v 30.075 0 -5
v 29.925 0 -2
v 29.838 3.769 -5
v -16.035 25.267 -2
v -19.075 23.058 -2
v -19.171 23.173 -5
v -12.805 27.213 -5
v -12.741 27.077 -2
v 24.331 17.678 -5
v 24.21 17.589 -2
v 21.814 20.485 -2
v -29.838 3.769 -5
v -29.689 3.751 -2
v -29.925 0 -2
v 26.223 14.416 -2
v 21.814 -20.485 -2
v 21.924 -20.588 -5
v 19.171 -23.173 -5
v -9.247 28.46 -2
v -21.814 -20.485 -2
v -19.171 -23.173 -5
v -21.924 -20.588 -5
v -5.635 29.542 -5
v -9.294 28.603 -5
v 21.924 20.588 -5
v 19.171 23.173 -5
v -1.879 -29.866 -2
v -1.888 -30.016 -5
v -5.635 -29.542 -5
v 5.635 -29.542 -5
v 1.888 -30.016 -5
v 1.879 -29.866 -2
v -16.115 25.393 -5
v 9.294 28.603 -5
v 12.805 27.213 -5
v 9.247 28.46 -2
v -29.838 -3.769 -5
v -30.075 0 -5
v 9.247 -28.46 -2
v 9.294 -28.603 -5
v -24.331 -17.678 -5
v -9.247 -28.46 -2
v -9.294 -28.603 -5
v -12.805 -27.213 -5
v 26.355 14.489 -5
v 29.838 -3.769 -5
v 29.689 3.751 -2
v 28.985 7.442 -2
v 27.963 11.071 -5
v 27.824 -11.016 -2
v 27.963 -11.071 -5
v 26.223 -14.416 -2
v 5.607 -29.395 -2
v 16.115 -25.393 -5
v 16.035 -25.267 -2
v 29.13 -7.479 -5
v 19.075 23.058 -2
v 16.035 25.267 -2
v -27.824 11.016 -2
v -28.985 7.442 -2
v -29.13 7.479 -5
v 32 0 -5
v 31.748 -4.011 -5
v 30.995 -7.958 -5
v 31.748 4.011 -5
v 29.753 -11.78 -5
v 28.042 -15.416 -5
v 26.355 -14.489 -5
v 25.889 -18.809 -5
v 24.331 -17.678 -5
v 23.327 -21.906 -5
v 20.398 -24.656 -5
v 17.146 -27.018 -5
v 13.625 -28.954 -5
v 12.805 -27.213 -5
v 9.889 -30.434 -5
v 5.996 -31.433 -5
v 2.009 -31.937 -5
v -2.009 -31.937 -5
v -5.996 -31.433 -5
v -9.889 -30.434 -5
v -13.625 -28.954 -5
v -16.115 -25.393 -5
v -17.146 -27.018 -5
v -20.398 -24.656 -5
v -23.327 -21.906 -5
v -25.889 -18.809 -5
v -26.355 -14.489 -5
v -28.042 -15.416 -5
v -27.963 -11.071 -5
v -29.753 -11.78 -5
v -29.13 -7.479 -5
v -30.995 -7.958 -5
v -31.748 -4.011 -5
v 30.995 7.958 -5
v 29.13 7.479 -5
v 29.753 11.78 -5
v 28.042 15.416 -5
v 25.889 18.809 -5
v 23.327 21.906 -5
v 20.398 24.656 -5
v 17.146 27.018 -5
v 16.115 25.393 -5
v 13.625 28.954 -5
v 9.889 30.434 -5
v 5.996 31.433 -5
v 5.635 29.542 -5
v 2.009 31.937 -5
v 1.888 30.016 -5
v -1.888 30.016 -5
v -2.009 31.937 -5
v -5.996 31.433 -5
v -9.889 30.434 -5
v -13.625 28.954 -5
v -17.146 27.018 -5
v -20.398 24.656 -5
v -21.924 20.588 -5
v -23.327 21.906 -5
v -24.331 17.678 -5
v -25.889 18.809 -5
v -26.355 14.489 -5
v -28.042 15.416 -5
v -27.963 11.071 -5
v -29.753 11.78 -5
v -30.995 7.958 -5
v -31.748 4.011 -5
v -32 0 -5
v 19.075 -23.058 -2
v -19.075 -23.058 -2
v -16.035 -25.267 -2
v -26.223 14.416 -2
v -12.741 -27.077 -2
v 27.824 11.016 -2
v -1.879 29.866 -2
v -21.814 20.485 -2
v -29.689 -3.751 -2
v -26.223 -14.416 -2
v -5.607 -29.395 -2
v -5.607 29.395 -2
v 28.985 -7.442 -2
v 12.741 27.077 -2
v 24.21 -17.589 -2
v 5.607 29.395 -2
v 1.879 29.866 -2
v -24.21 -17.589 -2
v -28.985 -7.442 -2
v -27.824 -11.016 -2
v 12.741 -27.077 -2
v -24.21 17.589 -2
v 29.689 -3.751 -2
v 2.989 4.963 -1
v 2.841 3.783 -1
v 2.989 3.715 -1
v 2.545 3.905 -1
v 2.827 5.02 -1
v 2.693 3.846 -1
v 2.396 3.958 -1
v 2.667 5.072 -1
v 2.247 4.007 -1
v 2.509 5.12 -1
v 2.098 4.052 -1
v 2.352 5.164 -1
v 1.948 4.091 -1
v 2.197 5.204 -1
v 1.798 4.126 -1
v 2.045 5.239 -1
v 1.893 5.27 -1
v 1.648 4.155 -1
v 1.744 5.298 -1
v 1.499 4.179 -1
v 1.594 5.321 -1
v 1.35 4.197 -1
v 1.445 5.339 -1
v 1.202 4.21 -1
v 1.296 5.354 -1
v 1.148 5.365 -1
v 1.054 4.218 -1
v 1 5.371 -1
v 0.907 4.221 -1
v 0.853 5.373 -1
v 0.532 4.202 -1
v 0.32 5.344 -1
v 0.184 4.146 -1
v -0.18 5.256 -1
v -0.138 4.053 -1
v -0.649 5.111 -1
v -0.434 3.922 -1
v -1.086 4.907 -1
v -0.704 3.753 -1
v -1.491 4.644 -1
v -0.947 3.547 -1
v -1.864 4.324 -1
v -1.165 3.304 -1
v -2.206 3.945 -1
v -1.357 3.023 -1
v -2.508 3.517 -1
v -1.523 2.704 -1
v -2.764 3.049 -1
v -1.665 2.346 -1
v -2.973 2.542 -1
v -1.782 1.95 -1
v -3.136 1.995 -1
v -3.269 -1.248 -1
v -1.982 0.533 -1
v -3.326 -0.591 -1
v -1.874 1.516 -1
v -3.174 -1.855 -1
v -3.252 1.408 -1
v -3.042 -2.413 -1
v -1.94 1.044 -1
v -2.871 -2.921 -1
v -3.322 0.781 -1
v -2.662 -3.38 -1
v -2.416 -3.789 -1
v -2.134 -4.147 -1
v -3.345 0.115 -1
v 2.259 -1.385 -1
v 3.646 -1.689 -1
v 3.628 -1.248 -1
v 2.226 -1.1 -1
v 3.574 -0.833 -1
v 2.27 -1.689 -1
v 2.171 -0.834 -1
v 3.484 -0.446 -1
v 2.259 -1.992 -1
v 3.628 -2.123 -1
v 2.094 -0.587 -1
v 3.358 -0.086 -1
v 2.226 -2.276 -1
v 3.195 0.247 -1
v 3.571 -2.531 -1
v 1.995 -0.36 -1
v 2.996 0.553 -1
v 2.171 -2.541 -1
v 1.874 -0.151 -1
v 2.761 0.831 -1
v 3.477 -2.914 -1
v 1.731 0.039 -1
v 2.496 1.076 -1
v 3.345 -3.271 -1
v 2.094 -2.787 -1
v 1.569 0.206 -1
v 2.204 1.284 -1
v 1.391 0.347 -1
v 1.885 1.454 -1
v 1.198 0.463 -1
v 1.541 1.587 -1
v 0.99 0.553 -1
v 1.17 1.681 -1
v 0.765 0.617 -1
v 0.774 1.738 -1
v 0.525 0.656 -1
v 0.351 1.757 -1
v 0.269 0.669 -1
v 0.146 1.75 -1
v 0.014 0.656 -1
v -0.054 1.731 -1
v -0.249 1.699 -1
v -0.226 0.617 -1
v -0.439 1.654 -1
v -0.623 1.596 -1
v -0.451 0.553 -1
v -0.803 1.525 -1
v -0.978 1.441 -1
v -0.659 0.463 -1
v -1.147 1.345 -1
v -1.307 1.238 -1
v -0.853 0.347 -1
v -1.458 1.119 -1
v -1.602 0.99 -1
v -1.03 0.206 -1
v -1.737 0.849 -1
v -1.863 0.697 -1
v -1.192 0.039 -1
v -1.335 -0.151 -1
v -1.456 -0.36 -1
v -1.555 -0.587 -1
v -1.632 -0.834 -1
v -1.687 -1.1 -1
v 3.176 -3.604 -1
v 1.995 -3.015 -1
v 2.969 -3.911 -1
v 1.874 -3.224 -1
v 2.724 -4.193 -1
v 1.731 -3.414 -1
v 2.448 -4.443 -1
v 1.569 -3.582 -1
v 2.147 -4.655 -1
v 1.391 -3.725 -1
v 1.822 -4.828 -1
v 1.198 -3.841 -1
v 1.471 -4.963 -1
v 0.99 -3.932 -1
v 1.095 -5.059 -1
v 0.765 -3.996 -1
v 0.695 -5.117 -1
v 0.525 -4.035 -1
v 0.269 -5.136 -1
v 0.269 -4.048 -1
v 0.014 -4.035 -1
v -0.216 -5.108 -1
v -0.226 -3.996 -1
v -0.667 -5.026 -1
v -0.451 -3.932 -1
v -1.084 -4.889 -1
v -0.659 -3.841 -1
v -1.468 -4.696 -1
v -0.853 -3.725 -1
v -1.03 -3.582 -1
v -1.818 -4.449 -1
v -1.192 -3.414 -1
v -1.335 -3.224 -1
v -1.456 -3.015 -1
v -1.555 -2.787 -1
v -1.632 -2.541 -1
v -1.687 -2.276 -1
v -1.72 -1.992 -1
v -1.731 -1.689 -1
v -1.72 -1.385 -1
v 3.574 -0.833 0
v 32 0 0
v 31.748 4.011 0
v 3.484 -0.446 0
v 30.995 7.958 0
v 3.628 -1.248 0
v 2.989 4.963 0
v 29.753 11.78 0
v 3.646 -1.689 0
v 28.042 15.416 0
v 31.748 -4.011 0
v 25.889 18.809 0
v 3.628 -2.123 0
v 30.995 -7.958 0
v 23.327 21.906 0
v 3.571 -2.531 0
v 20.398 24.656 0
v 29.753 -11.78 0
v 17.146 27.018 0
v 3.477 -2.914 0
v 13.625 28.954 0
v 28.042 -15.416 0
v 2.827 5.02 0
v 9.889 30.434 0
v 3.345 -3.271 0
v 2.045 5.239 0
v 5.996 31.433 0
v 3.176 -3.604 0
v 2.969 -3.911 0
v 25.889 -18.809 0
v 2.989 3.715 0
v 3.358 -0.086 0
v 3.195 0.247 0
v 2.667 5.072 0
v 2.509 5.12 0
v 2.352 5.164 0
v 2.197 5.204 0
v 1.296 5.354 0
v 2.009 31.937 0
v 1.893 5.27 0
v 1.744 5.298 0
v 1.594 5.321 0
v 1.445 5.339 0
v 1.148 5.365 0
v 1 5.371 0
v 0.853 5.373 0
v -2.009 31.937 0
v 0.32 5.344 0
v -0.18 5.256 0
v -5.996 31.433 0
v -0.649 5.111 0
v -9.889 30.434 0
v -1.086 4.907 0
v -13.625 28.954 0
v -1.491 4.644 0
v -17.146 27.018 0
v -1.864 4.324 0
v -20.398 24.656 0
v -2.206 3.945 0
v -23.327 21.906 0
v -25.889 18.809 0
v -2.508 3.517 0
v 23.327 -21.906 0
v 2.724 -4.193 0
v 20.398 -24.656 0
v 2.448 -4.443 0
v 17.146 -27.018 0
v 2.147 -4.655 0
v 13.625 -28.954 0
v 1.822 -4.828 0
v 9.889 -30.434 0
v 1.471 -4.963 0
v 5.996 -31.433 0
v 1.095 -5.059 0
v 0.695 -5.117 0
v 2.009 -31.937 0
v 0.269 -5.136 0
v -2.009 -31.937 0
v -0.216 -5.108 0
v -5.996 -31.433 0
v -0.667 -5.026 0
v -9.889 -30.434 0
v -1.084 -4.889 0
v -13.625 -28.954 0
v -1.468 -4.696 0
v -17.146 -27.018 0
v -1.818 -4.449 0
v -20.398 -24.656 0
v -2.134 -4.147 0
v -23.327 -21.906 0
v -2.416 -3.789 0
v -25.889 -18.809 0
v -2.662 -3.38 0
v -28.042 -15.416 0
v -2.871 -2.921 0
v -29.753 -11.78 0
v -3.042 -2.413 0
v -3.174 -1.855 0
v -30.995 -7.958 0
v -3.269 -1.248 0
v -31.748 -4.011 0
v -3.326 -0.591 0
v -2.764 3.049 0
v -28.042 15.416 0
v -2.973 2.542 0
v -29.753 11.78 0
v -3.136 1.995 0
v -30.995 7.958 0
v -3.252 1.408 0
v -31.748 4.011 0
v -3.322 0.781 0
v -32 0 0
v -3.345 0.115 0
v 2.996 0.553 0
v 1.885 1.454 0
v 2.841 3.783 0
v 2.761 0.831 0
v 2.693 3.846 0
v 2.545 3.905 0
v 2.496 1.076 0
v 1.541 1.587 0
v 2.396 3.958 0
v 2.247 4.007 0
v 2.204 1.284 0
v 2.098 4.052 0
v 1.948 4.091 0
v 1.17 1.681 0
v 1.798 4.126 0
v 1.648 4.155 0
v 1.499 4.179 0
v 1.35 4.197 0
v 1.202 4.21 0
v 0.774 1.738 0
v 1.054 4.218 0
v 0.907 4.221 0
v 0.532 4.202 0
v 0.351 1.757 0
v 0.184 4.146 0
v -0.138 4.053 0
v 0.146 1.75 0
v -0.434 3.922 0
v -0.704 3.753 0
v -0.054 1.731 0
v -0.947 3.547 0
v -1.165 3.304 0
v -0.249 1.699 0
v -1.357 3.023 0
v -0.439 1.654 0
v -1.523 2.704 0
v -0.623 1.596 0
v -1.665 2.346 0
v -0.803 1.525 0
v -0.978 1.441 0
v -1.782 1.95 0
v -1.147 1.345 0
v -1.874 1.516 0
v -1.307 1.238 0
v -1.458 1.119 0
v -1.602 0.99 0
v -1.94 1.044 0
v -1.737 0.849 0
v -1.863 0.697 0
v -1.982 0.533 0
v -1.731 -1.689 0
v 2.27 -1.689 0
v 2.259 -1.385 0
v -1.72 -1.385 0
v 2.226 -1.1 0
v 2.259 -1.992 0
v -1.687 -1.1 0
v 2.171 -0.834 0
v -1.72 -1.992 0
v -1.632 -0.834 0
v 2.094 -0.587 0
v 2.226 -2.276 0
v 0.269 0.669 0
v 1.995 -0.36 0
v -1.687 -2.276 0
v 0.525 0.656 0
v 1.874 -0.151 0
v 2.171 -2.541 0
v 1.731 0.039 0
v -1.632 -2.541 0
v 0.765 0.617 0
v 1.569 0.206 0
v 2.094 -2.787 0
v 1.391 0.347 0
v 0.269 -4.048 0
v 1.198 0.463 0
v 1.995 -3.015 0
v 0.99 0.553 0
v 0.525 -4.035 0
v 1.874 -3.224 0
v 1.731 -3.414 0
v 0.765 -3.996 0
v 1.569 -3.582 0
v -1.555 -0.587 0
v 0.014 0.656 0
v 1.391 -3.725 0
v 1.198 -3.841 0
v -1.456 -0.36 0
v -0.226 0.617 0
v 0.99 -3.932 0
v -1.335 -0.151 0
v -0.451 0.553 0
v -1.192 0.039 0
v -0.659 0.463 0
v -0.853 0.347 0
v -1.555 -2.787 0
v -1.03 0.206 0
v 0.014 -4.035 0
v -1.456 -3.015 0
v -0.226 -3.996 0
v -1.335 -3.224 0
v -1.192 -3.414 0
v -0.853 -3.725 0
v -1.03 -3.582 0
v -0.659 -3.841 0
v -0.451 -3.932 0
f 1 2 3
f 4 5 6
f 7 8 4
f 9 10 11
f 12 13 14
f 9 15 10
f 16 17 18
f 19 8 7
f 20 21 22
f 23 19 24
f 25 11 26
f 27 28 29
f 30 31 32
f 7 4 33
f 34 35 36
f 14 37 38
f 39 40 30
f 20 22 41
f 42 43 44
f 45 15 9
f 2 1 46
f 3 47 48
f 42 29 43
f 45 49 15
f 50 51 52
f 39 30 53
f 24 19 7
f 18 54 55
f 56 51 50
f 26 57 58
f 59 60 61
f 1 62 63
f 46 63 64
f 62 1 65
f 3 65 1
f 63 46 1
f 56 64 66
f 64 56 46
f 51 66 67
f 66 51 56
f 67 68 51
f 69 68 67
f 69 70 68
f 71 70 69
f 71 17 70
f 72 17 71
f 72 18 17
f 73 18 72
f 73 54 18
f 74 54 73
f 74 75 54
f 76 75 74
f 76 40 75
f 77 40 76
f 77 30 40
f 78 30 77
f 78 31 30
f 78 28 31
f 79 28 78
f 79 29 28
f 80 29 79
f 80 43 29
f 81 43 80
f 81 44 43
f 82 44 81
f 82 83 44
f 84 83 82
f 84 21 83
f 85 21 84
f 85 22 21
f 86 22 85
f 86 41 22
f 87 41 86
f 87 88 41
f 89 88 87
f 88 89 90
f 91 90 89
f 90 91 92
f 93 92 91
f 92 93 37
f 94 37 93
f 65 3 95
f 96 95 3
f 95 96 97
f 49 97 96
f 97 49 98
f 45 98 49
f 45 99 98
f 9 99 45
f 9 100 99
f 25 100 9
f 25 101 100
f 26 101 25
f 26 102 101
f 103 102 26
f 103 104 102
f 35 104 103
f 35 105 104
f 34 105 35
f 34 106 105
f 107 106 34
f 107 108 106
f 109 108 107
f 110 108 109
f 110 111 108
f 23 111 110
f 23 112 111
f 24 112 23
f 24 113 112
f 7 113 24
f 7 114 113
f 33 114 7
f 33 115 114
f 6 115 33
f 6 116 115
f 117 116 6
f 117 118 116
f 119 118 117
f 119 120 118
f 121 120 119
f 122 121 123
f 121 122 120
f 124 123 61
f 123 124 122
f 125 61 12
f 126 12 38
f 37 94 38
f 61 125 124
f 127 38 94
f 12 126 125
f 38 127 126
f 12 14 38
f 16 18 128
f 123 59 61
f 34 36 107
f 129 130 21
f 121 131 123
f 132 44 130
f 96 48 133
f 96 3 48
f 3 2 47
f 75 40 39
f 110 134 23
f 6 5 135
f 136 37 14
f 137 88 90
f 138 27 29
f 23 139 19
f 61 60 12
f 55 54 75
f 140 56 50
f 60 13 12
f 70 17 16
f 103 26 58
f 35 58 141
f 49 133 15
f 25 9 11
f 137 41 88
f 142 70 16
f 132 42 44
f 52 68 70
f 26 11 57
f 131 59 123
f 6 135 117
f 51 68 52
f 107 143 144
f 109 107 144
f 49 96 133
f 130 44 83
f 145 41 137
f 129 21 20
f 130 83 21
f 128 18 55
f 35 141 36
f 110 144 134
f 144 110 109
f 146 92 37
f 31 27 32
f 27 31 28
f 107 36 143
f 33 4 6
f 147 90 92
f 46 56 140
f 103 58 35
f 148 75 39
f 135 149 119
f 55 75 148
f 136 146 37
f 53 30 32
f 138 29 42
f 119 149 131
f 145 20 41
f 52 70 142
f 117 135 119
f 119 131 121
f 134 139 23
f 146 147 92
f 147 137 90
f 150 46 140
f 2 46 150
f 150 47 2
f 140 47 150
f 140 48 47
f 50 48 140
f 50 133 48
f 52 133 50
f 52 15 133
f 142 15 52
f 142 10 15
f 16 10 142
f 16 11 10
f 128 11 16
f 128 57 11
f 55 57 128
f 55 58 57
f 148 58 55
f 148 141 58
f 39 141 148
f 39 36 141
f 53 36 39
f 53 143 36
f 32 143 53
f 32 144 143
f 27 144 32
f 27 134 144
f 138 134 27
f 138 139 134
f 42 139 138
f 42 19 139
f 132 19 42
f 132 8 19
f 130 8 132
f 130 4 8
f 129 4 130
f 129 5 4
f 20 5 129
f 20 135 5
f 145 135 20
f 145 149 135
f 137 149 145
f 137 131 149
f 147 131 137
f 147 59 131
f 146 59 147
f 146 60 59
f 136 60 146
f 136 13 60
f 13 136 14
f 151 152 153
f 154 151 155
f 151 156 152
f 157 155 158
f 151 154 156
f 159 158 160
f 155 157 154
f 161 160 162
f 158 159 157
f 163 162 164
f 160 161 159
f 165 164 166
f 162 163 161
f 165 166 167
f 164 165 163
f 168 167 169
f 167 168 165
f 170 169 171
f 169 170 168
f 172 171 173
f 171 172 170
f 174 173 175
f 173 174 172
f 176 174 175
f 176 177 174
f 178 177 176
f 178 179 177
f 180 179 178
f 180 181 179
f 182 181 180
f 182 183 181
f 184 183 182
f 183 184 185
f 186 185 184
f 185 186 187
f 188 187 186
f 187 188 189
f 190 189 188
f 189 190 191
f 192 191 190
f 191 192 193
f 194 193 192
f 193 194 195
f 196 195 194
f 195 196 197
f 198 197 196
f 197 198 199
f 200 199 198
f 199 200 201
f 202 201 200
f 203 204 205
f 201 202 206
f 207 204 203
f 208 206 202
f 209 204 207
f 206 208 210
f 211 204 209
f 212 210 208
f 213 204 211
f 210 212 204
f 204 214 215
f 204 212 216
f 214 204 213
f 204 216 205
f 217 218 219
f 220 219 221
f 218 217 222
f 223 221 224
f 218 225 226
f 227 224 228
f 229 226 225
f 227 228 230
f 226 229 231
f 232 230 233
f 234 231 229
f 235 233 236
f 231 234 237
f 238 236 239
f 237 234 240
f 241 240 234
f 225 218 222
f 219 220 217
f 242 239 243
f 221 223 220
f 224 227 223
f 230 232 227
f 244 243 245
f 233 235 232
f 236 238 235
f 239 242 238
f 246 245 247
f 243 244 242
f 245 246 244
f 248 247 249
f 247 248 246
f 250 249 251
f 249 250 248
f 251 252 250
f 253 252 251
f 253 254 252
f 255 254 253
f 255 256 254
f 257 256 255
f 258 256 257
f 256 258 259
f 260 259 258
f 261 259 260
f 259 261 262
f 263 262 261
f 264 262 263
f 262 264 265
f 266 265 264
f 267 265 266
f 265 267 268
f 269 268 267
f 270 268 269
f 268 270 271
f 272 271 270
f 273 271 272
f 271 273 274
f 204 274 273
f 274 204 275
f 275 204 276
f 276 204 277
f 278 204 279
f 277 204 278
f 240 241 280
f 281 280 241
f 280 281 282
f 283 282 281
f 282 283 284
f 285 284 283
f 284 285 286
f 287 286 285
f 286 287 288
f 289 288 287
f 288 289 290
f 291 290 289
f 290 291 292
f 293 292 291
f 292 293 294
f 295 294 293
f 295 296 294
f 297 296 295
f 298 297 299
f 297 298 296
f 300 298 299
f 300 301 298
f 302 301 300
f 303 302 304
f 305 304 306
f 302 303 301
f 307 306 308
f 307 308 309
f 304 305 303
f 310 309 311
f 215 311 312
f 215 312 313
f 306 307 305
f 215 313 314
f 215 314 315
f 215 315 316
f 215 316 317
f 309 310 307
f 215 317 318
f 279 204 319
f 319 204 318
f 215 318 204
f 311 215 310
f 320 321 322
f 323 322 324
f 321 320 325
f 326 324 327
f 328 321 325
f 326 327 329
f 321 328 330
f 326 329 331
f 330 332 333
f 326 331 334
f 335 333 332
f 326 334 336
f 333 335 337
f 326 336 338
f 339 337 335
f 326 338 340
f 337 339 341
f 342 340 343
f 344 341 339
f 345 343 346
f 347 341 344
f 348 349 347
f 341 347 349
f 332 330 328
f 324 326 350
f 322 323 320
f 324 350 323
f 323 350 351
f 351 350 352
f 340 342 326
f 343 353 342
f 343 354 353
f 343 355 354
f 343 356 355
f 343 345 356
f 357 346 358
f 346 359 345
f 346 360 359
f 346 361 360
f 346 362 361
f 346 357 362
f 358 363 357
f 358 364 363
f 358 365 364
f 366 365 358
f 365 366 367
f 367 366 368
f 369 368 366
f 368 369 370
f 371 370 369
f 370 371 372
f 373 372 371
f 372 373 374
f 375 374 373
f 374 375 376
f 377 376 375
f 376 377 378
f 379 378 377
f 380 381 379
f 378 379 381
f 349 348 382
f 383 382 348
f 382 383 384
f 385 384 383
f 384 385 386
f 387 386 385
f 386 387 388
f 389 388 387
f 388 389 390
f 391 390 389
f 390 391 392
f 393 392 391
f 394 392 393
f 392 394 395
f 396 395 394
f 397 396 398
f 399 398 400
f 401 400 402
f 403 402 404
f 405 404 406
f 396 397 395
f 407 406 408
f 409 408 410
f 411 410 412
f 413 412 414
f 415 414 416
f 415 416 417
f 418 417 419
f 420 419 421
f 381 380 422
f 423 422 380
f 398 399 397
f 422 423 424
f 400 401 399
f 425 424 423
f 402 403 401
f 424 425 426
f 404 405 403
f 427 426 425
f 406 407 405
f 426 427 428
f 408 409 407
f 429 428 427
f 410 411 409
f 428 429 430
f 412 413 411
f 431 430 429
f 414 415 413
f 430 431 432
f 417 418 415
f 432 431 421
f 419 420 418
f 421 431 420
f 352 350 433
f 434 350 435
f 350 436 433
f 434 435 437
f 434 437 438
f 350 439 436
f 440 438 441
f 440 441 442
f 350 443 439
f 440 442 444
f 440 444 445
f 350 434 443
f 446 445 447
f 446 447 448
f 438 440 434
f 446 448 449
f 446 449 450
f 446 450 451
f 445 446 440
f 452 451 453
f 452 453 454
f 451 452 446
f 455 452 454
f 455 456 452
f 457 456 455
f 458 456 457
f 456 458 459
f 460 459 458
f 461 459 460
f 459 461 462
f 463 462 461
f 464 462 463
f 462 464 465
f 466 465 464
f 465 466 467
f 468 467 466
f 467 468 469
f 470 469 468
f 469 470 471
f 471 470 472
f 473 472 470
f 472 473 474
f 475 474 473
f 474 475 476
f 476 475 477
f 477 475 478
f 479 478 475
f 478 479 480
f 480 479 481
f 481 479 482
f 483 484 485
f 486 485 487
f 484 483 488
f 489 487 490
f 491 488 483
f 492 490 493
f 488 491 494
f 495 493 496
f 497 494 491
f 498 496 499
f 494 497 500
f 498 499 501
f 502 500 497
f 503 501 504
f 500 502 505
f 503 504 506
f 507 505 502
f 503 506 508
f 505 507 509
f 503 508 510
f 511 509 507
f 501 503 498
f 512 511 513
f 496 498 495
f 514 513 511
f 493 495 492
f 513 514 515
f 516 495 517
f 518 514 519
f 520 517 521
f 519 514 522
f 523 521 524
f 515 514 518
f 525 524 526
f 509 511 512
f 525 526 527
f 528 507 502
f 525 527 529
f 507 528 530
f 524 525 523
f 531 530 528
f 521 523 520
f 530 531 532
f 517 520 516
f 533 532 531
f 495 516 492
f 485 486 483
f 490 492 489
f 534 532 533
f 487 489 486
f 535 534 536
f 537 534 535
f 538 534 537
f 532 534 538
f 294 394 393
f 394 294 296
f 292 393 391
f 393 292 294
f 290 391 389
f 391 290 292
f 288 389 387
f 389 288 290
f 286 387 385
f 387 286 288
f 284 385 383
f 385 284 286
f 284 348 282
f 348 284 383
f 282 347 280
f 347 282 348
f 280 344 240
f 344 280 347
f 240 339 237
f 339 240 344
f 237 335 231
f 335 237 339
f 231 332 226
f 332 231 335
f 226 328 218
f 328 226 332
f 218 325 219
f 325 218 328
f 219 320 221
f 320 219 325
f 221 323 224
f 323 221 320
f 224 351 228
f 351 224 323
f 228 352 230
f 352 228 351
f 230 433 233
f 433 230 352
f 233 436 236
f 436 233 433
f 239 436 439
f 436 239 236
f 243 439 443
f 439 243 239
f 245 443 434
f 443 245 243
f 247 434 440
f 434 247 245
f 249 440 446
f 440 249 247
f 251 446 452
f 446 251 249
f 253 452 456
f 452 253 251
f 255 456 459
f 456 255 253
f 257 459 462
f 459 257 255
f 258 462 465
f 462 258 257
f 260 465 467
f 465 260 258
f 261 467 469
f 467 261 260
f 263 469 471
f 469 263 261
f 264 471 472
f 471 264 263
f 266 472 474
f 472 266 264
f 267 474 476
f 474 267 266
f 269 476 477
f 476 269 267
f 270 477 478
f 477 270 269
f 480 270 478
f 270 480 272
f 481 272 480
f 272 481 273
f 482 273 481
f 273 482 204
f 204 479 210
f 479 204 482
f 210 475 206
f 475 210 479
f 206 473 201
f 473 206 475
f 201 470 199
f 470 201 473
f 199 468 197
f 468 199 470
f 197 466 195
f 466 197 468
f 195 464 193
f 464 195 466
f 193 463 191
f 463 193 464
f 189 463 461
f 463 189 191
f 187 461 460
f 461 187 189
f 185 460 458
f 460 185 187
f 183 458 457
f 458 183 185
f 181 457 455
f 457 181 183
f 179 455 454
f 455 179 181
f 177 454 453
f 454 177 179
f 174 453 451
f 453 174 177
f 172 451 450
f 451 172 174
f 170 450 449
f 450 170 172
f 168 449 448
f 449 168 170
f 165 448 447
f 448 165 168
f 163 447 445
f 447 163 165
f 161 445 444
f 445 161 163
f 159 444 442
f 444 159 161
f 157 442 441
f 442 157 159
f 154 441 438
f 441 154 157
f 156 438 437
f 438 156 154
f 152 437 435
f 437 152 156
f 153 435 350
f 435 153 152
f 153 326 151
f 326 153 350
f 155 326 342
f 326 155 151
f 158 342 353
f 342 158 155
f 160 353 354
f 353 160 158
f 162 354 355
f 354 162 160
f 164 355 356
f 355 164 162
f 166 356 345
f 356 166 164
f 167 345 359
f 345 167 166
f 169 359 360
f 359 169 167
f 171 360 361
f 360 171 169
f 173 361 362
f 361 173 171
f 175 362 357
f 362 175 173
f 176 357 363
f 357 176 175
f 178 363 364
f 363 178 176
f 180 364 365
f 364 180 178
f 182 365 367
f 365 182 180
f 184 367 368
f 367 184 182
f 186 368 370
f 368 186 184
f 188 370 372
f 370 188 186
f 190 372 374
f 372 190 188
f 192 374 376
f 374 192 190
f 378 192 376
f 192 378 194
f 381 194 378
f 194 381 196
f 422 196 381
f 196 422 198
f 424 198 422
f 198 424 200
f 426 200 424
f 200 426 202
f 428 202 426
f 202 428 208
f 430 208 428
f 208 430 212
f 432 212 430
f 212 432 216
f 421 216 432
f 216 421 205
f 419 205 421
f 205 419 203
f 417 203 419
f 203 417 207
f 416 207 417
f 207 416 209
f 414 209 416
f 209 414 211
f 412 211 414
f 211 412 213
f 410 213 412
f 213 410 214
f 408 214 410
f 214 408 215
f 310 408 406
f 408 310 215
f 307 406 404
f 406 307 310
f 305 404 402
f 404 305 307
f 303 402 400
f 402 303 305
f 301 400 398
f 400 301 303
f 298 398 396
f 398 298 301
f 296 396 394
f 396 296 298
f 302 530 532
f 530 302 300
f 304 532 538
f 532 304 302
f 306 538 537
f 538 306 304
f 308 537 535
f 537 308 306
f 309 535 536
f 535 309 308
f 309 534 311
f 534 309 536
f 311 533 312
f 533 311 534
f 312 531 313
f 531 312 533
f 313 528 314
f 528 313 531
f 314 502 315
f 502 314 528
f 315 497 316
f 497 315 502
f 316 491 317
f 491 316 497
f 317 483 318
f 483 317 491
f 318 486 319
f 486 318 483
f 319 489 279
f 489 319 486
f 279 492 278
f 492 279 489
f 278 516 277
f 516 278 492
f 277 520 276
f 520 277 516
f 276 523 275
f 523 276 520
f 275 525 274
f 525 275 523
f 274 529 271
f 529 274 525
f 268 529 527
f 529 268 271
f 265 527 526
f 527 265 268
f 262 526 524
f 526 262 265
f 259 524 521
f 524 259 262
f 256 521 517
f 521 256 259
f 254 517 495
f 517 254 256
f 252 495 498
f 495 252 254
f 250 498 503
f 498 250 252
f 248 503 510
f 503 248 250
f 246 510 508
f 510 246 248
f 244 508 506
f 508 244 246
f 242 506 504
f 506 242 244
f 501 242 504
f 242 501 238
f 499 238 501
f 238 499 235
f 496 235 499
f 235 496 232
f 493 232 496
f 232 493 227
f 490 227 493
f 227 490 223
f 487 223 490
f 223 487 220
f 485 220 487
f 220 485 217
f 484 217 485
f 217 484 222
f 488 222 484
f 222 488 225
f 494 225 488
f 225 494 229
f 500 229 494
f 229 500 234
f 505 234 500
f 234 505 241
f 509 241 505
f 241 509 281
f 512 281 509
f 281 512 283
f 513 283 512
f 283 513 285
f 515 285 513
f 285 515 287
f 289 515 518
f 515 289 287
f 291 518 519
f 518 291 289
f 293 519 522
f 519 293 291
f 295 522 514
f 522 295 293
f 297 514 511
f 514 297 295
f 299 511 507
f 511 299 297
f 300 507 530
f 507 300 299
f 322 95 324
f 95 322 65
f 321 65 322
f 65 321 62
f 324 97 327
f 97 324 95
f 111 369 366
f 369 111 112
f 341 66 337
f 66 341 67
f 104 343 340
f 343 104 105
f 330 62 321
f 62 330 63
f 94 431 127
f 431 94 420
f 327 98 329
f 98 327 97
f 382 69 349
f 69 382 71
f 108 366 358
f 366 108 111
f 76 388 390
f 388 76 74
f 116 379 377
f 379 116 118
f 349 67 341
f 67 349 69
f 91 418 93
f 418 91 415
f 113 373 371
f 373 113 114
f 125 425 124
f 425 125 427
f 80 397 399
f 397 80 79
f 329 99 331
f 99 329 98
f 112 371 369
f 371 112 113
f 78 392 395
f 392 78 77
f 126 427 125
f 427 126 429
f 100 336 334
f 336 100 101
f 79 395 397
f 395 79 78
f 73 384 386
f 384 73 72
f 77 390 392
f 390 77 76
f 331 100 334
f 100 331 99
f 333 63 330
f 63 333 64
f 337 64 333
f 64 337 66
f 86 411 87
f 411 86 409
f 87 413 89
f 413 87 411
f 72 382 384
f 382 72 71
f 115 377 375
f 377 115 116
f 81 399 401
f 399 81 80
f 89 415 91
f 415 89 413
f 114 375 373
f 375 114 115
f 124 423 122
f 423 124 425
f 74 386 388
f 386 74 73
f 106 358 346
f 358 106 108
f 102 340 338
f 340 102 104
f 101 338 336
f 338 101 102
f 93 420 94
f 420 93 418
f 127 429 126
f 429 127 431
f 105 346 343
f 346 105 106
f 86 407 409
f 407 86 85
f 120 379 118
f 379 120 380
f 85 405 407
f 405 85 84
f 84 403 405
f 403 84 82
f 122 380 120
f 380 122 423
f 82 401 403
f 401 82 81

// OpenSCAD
$fn = 50;


difference() {
	union() {
		translate(v = [0, 0, -5.0000000000]) {
			cylinder(h = 5, r = 32.0000000000);
		}
	}
	union() {
		#translate(v = [0, 0, -5.0000000000]) {
			cylinder(h = 3, r1 = 30.0750000000, r2 = 29.9250000000);
		}
		translate(v = [0, 0, -1]) {
			linear_extrude(height = 1) {
				text(font = "Impact", halign = "center", size = 10, text = "6", valign = "center");
			}
		}
	}
}
